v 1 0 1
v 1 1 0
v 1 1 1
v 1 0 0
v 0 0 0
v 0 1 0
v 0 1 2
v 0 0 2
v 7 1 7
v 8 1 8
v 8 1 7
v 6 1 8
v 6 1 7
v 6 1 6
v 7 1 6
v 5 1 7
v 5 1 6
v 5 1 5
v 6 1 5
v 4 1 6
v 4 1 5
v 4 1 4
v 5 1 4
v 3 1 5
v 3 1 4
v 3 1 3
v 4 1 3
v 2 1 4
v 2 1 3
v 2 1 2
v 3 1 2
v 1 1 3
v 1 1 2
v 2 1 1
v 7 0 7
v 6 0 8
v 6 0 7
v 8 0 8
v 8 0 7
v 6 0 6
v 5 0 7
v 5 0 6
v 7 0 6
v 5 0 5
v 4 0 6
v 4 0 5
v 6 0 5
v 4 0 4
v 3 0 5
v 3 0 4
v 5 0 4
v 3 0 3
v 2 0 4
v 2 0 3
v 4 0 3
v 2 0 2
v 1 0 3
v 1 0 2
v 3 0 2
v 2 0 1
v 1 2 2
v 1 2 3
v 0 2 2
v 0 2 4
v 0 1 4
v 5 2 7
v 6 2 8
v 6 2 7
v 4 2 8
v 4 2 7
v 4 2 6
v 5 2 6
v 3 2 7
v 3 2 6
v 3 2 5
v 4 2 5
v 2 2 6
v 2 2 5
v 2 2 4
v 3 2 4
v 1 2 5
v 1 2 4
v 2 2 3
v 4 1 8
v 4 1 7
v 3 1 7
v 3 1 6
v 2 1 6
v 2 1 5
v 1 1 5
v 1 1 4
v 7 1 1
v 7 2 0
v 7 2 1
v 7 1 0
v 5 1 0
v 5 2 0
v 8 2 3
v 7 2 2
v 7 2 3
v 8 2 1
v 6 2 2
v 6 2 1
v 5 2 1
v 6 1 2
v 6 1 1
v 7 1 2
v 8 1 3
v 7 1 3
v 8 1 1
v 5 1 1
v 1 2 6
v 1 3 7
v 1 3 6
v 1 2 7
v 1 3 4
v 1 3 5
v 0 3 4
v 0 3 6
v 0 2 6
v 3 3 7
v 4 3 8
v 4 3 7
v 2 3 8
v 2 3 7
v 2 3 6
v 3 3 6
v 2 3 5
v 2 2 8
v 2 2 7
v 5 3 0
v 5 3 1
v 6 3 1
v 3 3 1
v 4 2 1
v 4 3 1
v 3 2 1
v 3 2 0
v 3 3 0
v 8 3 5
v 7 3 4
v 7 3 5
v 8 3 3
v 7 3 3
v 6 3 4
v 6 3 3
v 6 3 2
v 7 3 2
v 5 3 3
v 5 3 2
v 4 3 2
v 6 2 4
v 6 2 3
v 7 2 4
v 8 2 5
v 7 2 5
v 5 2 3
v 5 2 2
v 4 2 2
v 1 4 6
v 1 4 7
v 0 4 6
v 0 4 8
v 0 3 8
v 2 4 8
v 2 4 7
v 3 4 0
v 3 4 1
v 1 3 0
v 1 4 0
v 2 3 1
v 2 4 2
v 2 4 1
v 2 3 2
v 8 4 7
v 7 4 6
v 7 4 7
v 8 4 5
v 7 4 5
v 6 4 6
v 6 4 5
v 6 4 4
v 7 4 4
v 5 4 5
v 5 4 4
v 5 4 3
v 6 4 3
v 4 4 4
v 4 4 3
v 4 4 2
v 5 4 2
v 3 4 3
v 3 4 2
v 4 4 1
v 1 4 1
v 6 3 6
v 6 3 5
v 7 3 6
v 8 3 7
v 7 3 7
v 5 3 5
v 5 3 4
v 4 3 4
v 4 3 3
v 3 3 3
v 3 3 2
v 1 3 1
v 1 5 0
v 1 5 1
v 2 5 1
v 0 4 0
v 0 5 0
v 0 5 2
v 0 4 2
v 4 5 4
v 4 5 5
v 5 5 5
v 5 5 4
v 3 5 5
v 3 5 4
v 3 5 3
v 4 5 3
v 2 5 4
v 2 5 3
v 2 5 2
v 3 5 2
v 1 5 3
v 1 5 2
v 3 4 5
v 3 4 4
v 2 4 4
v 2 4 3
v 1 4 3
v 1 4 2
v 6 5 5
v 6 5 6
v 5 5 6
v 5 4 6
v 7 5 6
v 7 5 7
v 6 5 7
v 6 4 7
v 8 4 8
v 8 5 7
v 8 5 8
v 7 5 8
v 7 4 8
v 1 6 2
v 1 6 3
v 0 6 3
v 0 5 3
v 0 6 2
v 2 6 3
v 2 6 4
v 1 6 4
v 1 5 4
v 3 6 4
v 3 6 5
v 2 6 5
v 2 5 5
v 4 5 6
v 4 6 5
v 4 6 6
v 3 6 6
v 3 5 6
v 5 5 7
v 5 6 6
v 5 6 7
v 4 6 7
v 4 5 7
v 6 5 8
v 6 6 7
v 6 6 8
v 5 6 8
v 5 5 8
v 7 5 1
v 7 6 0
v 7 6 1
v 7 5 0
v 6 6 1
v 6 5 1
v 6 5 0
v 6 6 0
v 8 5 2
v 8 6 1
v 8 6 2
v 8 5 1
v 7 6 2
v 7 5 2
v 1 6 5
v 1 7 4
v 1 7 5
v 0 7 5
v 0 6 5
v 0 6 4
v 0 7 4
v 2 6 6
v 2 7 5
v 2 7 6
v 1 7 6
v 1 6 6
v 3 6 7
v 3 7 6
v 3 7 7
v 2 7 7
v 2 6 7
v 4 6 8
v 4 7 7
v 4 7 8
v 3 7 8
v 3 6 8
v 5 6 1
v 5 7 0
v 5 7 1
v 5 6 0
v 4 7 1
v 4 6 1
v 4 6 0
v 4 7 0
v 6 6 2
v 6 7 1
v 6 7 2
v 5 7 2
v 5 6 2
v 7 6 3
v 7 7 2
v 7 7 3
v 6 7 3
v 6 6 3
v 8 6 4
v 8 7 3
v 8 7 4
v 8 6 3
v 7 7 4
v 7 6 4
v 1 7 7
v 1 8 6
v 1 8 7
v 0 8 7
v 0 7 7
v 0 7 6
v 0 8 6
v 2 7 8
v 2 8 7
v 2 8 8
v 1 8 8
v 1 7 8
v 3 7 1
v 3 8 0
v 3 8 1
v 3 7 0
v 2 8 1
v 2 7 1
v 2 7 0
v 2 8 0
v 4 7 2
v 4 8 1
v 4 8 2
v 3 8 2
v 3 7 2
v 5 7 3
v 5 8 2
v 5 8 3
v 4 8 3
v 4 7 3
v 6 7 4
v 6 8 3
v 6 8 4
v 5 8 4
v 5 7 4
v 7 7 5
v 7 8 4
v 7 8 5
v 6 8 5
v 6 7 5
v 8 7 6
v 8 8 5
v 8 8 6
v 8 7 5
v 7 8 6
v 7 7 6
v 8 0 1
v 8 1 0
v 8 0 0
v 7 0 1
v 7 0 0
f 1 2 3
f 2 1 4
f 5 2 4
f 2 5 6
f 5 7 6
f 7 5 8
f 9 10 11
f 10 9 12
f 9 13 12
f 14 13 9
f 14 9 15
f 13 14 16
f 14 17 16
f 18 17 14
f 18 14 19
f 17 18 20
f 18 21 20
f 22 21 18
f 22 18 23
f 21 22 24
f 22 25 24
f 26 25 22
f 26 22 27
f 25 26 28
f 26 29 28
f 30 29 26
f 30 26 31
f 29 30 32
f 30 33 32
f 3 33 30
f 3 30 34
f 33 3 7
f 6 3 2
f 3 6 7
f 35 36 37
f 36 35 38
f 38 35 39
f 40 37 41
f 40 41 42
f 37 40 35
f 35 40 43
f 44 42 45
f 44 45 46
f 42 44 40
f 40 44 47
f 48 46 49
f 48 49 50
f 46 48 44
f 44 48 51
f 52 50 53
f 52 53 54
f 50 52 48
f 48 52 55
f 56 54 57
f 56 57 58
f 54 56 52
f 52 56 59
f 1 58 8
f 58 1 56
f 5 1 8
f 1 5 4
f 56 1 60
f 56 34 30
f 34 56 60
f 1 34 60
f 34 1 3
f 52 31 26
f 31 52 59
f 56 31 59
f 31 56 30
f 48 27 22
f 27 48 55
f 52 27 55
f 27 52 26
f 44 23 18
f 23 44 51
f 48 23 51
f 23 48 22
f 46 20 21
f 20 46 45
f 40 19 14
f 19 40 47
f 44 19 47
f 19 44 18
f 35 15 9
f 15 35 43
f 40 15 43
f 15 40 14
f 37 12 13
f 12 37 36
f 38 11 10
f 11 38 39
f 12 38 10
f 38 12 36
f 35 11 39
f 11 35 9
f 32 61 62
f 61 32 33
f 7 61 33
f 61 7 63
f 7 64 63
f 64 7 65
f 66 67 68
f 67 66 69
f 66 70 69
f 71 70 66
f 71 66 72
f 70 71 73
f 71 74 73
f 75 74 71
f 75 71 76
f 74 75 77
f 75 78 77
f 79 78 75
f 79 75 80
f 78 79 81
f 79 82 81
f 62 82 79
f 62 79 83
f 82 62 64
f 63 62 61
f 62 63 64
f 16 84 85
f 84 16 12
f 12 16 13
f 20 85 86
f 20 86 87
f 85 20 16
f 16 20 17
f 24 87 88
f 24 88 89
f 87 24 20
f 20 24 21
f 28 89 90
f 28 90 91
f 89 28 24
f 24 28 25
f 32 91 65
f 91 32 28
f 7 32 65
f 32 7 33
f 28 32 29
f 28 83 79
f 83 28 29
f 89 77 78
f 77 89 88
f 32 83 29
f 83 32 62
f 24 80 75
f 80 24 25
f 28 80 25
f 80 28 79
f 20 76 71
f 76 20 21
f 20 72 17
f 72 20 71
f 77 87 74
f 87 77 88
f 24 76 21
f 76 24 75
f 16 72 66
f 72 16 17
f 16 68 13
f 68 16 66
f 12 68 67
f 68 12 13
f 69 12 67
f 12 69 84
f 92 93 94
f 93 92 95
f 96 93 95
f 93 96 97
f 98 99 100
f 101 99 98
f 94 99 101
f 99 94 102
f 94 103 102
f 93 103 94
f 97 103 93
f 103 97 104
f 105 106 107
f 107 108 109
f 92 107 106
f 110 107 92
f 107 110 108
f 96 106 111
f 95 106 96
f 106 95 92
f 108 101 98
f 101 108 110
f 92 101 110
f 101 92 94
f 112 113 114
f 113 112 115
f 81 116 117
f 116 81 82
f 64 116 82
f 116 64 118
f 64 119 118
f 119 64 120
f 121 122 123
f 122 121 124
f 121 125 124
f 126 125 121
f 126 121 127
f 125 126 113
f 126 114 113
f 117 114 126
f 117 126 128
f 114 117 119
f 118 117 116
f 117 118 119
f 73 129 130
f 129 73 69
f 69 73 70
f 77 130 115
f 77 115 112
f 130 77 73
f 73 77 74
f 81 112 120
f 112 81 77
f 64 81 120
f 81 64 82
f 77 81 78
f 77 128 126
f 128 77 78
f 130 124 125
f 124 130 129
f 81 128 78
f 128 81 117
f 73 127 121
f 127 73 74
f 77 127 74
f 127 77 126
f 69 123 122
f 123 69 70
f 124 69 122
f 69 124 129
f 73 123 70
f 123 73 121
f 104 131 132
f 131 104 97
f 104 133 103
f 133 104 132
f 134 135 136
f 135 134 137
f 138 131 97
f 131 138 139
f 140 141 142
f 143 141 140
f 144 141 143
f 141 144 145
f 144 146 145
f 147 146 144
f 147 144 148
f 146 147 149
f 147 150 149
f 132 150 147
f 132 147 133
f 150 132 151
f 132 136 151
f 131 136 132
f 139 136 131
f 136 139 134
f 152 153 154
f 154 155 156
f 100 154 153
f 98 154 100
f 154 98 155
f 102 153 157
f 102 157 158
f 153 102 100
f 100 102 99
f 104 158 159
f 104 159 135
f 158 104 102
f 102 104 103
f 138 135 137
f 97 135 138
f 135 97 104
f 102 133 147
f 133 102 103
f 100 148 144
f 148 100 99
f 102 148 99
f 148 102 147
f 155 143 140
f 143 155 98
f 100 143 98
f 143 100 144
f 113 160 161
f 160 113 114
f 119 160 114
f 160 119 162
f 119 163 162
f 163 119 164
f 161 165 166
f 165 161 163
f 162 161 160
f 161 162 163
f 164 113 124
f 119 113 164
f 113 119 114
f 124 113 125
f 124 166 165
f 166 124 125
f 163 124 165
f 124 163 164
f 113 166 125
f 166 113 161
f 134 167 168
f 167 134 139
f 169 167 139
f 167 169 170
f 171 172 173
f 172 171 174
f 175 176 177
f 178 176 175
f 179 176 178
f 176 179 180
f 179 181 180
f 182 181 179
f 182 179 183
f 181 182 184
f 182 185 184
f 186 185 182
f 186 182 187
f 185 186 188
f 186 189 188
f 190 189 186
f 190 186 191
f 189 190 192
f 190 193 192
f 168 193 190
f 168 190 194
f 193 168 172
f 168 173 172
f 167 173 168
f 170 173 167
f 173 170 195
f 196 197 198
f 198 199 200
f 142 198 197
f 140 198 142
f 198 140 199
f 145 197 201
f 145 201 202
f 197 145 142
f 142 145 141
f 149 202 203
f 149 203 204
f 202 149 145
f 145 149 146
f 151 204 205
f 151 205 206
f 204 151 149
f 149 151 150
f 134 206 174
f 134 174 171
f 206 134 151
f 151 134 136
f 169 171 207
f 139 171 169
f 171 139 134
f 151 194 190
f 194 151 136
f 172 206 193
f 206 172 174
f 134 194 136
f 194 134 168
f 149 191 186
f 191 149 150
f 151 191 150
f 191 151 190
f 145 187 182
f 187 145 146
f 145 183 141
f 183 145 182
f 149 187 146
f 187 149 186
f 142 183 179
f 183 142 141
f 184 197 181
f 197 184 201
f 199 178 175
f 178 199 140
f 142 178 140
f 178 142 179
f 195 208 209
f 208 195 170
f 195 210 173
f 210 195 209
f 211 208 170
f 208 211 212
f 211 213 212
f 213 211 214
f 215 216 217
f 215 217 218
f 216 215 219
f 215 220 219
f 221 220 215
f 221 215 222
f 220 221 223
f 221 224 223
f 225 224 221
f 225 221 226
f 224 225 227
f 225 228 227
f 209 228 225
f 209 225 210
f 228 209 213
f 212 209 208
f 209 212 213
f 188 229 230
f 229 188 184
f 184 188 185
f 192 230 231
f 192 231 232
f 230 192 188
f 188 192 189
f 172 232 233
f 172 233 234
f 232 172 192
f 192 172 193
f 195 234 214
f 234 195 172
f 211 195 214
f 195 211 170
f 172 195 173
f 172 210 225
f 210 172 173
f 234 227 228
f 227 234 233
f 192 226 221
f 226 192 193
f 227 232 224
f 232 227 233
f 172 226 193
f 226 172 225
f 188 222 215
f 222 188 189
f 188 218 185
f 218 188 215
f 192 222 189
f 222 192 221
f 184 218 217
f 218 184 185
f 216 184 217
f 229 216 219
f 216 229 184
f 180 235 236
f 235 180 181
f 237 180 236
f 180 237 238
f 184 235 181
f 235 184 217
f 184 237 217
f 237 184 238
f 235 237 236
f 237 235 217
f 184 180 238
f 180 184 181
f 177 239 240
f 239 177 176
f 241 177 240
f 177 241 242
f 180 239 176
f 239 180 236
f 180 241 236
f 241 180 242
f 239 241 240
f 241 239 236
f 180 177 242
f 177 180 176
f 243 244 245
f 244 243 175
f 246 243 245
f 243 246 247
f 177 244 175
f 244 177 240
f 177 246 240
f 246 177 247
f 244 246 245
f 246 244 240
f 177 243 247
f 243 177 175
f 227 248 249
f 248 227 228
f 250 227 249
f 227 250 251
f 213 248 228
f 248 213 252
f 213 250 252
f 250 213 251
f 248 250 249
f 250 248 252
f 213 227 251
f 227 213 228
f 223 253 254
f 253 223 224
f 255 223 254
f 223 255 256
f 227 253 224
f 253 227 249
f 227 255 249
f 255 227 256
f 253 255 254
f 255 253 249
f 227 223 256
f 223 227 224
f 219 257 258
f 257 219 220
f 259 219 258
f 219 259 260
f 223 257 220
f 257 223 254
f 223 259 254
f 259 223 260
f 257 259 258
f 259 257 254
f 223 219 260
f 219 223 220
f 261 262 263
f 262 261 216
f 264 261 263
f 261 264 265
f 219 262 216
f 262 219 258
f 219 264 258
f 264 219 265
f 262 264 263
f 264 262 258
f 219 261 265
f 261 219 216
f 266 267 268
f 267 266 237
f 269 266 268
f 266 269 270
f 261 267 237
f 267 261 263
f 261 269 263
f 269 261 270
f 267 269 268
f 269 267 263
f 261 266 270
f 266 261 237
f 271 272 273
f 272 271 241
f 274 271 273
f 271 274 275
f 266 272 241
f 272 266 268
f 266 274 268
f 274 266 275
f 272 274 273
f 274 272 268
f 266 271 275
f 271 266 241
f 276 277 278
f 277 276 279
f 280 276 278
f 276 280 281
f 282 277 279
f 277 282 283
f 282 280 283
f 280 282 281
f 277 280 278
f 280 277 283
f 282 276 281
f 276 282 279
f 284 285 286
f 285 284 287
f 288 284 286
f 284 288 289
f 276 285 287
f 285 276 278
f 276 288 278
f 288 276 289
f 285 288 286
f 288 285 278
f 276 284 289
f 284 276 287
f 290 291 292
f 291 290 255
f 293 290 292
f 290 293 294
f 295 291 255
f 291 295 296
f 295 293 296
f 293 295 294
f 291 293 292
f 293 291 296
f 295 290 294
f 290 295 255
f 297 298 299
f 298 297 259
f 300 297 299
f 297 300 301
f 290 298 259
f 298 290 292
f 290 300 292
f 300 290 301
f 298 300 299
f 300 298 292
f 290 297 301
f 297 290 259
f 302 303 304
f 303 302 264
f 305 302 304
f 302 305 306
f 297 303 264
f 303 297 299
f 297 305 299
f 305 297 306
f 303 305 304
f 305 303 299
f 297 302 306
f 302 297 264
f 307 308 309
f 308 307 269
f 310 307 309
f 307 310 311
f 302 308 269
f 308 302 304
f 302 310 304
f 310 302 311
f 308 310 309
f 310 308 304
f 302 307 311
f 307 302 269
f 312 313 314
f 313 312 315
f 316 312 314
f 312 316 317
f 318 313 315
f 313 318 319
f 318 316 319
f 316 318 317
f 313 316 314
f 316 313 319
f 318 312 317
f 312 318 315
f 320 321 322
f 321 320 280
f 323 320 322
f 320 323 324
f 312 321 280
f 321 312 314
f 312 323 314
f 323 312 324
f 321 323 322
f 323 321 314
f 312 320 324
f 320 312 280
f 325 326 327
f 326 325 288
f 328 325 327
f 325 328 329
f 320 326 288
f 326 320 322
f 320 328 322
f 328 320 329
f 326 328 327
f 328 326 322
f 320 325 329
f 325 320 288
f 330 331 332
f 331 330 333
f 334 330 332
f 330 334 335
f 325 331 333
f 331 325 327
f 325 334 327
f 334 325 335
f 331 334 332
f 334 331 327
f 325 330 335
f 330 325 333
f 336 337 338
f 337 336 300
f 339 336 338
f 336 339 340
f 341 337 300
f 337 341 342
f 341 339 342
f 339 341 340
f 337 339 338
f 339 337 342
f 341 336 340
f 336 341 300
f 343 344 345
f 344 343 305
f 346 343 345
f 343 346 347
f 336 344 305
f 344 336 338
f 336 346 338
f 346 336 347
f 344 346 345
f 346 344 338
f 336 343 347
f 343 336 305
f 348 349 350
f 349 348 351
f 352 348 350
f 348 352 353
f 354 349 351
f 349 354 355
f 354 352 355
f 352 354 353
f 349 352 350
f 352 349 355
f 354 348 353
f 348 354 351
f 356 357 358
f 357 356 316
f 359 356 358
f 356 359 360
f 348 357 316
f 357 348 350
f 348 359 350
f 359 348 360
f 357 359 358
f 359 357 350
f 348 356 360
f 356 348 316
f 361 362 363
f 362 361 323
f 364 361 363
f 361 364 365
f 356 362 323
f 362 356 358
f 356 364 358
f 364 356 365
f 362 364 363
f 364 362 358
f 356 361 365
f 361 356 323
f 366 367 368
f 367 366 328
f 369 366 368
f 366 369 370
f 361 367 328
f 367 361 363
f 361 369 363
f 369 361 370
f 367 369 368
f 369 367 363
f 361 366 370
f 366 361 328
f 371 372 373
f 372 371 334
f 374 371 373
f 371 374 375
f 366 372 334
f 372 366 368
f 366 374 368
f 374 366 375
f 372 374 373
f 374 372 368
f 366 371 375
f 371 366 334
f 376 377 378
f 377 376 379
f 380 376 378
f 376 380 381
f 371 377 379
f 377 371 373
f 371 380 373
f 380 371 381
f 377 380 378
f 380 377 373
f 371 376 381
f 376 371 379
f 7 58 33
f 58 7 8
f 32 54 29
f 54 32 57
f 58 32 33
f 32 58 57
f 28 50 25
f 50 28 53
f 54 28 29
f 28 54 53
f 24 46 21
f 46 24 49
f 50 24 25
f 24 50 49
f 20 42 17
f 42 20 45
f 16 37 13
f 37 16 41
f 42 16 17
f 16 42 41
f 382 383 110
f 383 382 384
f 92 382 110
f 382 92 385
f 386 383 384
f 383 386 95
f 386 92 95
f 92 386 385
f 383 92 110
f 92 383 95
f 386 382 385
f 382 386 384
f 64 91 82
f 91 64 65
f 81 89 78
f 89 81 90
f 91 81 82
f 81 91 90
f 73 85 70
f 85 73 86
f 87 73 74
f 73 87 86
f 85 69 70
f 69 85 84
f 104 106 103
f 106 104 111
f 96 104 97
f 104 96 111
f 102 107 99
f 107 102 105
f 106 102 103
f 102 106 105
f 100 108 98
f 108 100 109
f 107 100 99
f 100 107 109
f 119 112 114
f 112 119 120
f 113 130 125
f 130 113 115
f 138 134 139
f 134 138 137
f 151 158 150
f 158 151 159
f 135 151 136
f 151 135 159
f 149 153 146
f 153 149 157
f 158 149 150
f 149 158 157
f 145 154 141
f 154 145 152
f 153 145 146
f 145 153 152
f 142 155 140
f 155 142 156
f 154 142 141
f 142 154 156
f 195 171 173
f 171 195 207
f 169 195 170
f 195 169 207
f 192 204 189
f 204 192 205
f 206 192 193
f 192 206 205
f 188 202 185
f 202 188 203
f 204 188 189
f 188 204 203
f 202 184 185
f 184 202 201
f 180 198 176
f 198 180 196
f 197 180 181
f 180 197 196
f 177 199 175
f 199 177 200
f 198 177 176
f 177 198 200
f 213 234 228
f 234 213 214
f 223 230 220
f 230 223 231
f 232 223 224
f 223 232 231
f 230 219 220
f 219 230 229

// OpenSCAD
union() {
    translate([0, 0, 0]) cube([1, 1, 1]);
    translate([1, 0, 1]) cube([1, 1, 1]);
    translate([2, 0, 2]) cube([1, 1, 1]);
    translate([3, 0, 3]) cube([1, 1, 1]);
    translate([4, 0, 4]) cube([1, 1, 1]);
    translate([5, 0, 5]) cube([1, 1, 1]);
    translate([6, 0, 6]) cube([1, 1, 1]);
    translate([7, 0, 7]) cube([1, 1, 1]);
    translate([0, 1, 2]) cube([1, 1, 1]);
    translate([1, 1, 3]) cube([1, 1, 1]);
    translate([2, 1, 4]) cube([1, 1, 1]);
    translate([3, 1, 5]) cube([1, 1, 1]);
    translate([4, 1, 6]) cube([1, 1, 1]);
    translate([5, 1, 7]) cube([1, 1, 1]);
    translate([6, 1, 0]) cube([1, 1, 1]);
    translate([7, 1, 1]) cube([1, 1, 1]);
    translate([0, 2, 4]) cube([1, 1, 1]);
    translate([1, 2, 5]) cube([1, 1, 1]);
    translate([2, 2, 6]) cube([1, 1, 1]);
    translate([3, 2, 7]) cube([1, 1, 1]);
    translate([4, 2, 0]) cube([1, 1, 1]);
    translate([5, 2, 1]) cube([1, 1, 1]);
    translate([6, 2, 2]) cube([1, 1, 1]);
    translate([7, 2, 3]) cube([1, 1, 1]);
    translate([0, 3, 6]) cube([1, 1, 1]);
    translate([1, 3, 7]) cube([1, 1, 1]);
    translate([2, 3, 0]) cube([1, 1, 1]);
    translate([3, 3, 1]) cube([1, 1, 1]);
    translate([4, 3, 2]) cube([1, 1, 1]);
    translate([5, 3, 3]) cube([1, 1, 1]);
    translate([6, 3, 4]) cube([1, 1, 1]);
    translate([7, 3, 5]) cube([1, 1, 1]);
    translate([0, 4, 0]) cube([1, 1, 1]);
    translate([1, 4, 1]) cube([1, 1, 1]);
    translate([2, 4, 2]) cube([1, 1, 1]);
    translate([3, 4, 3]) cube([1, 1, 1]);
    translate([4, 4, 4]) cube([1, 1, 1]);
    translate([5, 4, 5]) cube([1, 1, 1]);
    translate([6, 4, 6]) cube([1, 1, 1]);
    translate([7, 4, 7]) cube([1, 1, 1]);
    translate([0, 5, 2]) cube([1, 1, 1]);
    translate([1, 5, 3]) cube([1, 1, 1]);
    translate([2, 5, 4]) cube([1, 1, 1]);
    translate([3, 5, 5]) cube([1, 1, 1]);
    translate([4, 5, 6]) cube([1, 1, 1]);
    translate([5, 5, 7]) cube([1, 1, 1]);
    translate([6, 5, 0]) cube([1, 1, 1]);
    translate([7, 5, 1]) cube([1, 1, 1]);
    translate([0, 6, 4]) cube([1, 1, 1]);
    translate([1, 6, 5]) cube([1, 1, 1]);
    translate([2, 6, 6]) cube([1, 1, 1]);
    translate([3, 6, 7]) cube([1, 1, 1]);
    translate([4, 6, 0]) cube([1, 1, 1]);
    translate([5, 6, 1]) cube([1, 1, 1]);
    translate([6, 6, 2]) cube([1, 1, 1]);
    translate([7, 6, 3]) cube([1, 1, 1]);
    translate([0, 7, 6]) cube([1, 1, 1]);
    translate([1, 7, 7]) cube([1, 1, 1]);
    translate([2, 7, 0]) cube([1, 1, 1]);
    translate([3, 7, 1]) cube([1, 1, 1]);
    translate([4, 7, 2]) cube([1, 1, 1]);
    translate([5, 7, 3]) cube([1, 1, 1]);
    translate([6, 7, 4]) cube([1, 1, 1]);
    translate([7, 7, 5]) cube([1, 1, 1]);
    translate([0, 0, 1]) cube([1, 1, 1]);
    translate([1, 0, 2]) cube([1, 1, 1]);
    translate([2, 0, 3]) cube([1, 1, 1]);
    translate([3, 0, 4]) cube([1, 1, 1]);
    translate([4, 0, 5]) cube([1, 1, 1]);
    translate([5, 0, 6]) cube([1, 1, 1]);
    translate([6, 0, 7]) cube([1, 1, 1]);
    translate([7, 0, 0]) cube([1, 1, 1]);
    translate([0, 1, 3]) cube([1, 1, 1]);
    translate([1, 1, 4]) cube([1, 1, 1]);
    translate([2, 1, 5]) cube([1, 1, 1]);
    translate([3, 1, 6]) cube([1, 1, 1]);
    translate([4, 1, 7]) cube([1, 1, 1]);
    translate([5, 1, 0]) cube([1, 1, 1]);
    translate([6, 1, 1]) cube([1, 1, 1]);
    translate([7, 1, 2]) cube([1, 1, 1]);
    translate([0, 2, 5]) cube([1, 1, 1]);
    translate([1, 2, 6]) cube([1, 1, 1]);
    translate([2, 2, 7]) cube([1, 1, 1]);
    translate([3, 2, 0]) cube([1, 1, 1]);
    translate([4, 2, 1]) cube([1, 1, 1]);
    translate([5, 2, 2]) cube([1, 1, 1]);
    translate([6, 2, 3]) cube([1, 1, 1]);
    translate([7, 2, 4]) cube([1, 1, 1]);
    translate([0, 3, 7]) cube([1, 1, 1]);
    translate([1, 3, 0]) cube([1, 1, 1]);
    translate([2, 3, 1]) cube([1, 1, 1]);
    translate([3, 3, 2]) cube([1, 1, 1]);
    translate([4, 3, 3]) cube([1, 1, 1]);
    translate([5, 3, 4]) cube([1, 1, 1]);
    translate([6, 3, 5]) cube([1, 1, 1]);
    translate([7, 3, 6]) cube([1, 1, 1]);
    translate([0, 4, 1]) cube([1, 1, 1]);
    translate([1, 4, 2]) cube([1, 1, 1]);
    translate([2, 4, 3]) cube([1, 1, 1]);
    translate([3, 4, 4]) cube([1, 1, 1]);
}
